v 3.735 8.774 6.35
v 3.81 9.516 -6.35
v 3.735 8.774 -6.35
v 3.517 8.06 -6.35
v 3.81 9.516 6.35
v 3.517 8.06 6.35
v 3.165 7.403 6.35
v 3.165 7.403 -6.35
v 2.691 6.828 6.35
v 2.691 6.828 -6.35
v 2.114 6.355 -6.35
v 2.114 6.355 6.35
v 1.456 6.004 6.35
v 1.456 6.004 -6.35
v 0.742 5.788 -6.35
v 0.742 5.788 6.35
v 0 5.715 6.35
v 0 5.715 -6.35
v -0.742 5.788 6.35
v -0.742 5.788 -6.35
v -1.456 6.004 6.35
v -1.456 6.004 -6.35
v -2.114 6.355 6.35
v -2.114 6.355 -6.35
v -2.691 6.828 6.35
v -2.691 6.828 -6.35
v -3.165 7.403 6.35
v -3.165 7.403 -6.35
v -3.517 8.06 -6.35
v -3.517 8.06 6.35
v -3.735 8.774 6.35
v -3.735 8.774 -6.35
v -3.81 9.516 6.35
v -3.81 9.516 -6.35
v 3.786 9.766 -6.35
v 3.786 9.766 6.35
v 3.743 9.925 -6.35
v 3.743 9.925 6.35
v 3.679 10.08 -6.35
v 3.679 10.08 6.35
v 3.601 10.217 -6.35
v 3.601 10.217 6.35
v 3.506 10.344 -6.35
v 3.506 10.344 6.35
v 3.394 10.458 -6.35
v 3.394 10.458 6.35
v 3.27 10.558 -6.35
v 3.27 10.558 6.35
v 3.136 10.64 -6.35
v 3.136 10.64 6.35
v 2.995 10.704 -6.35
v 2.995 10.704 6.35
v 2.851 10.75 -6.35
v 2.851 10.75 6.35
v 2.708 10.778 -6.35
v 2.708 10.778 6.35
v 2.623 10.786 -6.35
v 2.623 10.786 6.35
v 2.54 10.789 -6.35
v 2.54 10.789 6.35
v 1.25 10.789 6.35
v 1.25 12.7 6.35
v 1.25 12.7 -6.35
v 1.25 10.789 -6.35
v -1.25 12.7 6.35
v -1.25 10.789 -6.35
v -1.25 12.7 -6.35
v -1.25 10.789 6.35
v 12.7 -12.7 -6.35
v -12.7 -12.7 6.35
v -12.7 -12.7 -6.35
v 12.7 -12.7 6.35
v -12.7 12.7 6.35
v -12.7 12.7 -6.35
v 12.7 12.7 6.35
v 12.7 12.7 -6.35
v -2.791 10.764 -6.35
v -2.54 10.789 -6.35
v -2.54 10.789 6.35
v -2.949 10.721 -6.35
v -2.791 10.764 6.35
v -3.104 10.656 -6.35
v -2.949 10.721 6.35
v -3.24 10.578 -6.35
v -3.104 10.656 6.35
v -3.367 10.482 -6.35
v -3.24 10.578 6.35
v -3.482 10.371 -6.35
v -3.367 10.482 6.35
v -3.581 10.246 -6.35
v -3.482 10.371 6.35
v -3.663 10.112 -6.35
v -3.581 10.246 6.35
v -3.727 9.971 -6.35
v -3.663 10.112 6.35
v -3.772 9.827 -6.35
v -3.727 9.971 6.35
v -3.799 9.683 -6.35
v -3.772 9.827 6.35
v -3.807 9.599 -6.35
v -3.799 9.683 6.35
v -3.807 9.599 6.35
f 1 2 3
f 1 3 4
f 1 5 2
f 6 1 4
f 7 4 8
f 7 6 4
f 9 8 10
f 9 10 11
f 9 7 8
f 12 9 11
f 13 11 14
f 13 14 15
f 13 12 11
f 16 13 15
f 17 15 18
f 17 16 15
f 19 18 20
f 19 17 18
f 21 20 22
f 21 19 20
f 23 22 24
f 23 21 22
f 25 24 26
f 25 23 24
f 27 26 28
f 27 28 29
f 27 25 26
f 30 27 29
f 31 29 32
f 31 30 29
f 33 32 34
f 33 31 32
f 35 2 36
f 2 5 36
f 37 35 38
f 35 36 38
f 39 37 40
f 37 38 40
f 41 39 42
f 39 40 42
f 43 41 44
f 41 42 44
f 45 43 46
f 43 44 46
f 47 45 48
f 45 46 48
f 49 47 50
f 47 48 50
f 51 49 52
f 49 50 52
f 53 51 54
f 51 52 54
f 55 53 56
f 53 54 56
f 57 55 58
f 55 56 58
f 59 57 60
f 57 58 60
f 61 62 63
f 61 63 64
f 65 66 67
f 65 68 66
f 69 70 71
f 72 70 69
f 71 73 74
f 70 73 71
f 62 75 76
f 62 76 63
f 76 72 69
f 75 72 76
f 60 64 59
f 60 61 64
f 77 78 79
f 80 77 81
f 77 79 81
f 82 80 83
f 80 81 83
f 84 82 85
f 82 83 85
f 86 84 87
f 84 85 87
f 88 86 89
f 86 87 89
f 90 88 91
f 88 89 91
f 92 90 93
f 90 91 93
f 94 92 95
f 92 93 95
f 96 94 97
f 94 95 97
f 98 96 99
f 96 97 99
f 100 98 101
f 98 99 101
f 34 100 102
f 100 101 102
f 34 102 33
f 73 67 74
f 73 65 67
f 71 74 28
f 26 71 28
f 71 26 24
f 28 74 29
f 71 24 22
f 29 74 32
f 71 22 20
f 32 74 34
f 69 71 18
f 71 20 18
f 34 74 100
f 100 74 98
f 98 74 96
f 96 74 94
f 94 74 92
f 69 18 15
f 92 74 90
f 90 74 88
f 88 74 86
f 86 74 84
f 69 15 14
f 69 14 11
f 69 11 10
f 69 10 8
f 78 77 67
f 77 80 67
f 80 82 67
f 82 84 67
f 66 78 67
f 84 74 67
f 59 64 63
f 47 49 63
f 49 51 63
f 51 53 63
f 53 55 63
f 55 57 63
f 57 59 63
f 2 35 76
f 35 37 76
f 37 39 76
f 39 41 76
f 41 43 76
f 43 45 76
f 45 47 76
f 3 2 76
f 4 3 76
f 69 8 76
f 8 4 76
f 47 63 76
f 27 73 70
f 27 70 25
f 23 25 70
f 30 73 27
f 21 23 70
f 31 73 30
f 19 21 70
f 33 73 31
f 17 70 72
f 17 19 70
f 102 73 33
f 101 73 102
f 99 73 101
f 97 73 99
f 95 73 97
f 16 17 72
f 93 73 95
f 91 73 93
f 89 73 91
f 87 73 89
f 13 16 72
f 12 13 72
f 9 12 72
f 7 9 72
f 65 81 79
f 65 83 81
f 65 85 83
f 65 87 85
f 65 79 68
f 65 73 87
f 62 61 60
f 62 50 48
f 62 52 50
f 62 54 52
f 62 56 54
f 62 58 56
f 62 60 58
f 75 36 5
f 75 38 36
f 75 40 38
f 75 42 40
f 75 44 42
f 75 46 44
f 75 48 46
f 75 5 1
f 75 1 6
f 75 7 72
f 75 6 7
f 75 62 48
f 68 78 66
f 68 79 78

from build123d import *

# Parameters (mm, degrees)
F1_DEPTH = 6.35
F2_R     = 1.27


with BuildPart() as f1:
    # F0 (on Top) → F1 (new body, symmetric)
    with BuildSketch(Plane.XY):
        with BuildLine():
            Line((-12.7, 12.7), (-12.7, -12.7))
            Line((-12.7, -12.7), (12.7, -12.7))
            Line((12.7, -12.7), (12.7, 12.7))
            Line((12.7, 12.7), (1.250322, 12.7))
            Line((1.250322, 12.7), (1.250322, 10.788764))
            Line((1.250322, 10.788764), (3.81, 10.788764))
            Line((3.81, 10.788764), (3.81, 9.525))
            ThreePointArc((3.81, 9.525), (0, 5.715), (-3.81, 9.525))
            Line((-3.81, 9.525), (-3.81, 10.788764))
            Line((-3.81, 10.788764), (-1.250322, 10.788764))
            Line((-1.250322, 10.788764), (-1.250322, 12.7))
            Line((-1.250322, 12.7), (-12.7, 12.7))
        make_face()
    extrude(amount=F1_DEPTH, both=True)

    # F2
    f2_edges = [f1.edges().sort_by_distance(p)[0] for p in [
        (-3.81, 10.788764, 0),
        (3.81, 10.788764, 0),
    ]]
    fillet(f2_edges, radius=F2_R)


solid = f1.part
